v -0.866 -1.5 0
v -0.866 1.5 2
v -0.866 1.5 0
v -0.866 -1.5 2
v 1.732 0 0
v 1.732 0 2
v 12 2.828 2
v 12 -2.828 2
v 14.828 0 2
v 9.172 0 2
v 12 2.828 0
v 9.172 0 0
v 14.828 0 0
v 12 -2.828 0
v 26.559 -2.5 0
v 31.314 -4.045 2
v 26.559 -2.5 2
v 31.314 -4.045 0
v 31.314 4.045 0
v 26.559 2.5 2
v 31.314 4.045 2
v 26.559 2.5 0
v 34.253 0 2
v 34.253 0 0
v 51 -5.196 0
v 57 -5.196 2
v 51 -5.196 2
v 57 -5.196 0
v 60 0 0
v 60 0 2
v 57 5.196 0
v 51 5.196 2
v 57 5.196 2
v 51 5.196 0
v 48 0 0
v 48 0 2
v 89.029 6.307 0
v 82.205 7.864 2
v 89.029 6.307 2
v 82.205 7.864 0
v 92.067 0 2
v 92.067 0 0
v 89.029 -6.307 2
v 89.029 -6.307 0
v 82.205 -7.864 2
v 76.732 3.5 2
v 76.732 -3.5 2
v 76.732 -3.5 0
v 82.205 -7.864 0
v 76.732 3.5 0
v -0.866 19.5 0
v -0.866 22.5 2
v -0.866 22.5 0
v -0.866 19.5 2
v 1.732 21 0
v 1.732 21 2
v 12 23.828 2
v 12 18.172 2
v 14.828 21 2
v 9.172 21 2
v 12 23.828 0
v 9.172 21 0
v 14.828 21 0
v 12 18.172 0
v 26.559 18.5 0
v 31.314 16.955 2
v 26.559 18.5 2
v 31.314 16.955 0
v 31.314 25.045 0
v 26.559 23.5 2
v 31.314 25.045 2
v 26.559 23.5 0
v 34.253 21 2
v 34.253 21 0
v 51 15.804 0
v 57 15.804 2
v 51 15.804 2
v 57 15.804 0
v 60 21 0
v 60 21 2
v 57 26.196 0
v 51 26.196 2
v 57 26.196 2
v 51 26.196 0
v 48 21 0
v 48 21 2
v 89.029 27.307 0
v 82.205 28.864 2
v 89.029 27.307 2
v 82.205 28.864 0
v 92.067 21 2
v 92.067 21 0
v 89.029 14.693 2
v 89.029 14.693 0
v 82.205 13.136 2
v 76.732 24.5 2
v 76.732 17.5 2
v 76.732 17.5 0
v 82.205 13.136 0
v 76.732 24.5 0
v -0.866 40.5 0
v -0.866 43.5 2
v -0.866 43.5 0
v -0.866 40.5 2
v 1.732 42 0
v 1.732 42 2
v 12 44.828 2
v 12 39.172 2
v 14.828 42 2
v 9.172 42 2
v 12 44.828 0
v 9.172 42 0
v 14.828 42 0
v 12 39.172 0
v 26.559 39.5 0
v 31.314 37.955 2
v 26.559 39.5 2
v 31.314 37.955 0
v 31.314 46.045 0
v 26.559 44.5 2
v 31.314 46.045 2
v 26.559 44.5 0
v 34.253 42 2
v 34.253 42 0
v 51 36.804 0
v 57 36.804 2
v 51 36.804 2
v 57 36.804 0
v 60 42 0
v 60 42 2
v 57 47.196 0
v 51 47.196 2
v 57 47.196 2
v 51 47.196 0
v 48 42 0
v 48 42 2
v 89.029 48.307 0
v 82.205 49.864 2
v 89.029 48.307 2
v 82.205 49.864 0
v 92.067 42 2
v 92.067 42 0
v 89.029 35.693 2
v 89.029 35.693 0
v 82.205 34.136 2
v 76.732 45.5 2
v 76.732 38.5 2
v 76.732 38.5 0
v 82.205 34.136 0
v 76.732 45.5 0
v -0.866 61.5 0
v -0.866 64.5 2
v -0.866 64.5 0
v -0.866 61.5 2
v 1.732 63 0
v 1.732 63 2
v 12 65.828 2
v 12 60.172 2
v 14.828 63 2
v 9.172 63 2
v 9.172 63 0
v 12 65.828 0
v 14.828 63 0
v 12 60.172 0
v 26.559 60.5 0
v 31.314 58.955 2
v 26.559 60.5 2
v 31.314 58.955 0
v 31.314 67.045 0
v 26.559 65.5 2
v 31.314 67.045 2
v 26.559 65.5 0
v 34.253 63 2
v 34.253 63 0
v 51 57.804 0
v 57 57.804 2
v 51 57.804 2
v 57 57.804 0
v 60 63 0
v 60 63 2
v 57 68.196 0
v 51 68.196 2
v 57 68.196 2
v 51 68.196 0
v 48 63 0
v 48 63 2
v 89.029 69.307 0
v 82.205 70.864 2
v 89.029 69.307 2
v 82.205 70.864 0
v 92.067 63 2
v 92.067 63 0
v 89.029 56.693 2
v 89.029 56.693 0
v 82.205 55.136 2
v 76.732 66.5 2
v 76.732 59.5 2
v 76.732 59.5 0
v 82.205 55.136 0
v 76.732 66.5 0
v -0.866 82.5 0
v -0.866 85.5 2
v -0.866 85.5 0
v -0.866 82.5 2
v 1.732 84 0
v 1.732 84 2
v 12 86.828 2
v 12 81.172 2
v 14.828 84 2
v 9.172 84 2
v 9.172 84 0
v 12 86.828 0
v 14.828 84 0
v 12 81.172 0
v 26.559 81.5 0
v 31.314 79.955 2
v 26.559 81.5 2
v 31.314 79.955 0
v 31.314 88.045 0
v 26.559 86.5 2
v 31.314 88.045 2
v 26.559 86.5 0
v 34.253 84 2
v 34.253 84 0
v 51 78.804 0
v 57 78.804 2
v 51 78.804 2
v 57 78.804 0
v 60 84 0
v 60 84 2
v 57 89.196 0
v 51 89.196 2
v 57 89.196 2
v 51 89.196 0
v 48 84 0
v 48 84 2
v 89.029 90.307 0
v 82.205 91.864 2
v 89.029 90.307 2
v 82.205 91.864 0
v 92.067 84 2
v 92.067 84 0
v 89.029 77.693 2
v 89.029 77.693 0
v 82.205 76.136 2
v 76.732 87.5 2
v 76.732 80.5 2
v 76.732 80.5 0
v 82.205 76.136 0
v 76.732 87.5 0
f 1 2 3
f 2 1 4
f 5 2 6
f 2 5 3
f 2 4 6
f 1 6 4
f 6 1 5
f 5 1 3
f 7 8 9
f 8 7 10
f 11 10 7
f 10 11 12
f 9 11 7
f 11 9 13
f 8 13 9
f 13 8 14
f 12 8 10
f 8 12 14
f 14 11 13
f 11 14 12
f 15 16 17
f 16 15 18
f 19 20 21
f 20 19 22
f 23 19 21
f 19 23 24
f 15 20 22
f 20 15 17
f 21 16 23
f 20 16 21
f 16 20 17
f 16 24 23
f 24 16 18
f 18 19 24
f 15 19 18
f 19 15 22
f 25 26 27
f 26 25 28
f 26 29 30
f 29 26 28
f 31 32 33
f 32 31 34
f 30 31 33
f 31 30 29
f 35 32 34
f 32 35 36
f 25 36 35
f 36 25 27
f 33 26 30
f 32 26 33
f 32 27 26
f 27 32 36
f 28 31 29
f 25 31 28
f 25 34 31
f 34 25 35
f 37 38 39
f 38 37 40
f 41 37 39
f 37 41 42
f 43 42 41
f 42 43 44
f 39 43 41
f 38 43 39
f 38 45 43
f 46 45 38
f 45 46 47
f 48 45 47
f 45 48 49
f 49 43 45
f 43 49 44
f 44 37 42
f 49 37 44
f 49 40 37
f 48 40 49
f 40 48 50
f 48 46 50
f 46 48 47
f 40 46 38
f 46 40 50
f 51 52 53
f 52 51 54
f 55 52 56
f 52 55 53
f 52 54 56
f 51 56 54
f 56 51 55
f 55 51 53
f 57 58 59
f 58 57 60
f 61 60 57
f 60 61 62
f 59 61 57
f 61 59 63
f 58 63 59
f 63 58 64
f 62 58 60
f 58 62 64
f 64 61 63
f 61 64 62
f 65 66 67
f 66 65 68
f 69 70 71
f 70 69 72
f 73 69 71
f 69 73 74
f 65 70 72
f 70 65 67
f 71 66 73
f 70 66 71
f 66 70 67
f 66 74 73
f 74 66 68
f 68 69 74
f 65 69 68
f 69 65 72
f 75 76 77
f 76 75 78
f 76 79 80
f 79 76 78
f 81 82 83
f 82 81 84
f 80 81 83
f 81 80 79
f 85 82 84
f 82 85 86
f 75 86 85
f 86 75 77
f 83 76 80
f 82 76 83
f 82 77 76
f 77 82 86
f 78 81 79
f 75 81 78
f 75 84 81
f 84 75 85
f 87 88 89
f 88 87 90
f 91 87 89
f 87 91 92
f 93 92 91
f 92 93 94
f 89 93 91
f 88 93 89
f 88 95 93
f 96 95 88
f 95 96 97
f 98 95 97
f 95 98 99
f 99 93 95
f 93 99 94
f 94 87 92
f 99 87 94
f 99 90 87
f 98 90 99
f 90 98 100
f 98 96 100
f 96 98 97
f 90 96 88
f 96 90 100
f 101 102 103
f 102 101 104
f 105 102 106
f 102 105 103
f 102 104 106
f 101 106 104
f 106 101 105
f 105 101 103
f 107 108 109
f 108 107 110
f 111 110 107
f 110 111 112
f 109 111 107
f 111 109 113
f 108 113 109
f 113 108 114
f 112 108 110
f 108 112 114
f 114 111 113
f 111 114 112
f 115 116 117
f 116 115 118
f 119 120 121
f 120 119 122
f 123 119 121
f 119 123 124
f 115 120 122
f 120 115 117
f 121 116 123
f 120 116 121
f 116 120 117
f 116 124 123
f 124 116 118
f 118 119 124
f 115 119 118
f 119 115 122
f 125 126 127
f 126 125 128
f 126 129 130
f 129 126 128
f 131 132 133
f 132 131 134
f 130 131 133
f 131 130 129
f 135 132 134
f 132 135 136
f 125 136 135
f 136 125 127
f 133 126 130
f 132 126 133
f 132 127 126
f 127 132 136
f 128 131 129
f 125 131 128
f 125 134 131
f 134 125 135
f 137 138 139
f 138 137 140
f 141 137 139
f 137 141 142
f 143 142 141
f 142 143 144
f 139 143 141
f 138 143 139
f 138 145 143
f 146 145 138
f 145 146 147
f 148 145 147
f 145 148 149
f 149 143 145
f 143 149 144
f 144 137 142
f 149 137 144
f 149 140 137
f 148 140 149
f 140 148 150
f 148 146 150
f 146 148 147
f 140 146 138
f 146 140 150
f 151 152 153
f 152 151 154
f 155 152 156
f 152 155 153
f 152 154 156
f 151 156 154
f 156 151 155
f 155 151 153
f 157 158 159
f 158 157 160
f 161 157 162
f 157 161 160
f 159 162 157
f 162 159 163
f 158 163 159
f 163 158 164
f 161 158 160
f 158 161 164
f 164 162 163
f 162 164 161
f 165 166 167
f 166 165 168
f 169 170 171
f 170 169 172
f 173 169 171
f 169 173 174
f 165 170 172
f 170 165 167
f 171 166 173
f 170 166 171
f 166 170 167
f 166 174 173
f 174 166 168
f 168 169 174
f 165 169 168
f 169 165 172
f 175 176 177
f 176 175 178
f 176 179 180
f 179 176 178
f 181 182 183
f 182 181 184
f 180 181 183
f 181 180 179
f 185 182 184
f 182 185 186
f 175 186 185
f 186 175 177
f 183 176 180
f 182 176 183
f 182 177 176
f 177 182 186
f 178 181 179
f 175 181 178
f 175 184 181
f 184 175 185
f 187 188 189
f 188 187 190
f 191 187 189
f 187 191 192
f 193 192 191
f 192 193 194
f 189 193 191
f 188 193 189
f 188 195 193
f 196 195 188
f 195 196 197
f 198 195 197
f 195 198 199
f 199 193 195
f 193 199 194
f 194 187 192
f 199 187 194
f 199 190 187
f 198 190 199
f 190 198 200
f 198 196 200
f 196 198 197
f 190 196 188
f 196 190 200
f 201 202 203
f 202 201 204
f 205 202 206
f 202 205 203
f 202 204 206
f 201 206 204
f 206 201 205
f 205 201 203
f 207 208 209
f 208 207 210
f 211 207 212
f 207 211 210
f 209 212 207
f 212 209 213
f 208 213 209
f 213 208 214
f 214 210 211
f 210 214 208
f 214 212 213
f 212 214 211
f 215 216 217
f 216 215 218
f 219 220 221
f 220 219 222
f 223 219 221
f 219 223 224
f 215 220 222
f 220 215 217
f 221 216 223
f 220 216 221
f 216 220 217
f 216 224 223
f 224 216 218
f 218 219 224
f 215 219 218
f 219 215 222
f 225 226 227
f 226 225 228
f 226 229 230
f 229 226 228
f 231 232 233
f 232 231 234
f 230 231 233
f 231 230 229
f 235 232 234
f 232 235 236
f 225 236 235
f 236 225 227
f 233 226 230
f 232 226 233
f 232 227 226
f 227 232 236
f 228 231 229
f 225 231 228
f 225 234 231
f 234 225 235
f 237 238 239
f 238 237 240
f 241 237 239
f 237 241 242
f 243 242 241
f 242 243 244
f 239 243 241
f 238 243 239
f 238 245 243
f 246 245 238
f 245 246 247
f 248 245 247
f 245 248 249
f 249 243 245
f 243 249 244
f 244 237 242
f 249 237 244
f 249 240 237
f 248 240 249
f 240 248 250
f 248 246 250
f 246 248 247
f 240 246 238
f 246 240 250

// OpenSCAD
// Copyright 2019 Luke Johnson
// Copyright 2019 Michael K Johnson
// Licensed under the Creative Commons - Attribution license.
// http://creativecommons.org/licenses/by/3.0/

// Create a set of polygon tiles, all with the same length sides

// How many sides should the larges polygon have?
max_sides=7; // [3:16]
// How many tiles of each size?
quantity=5; // [1:10]
// How long should each side be (mm)
side_length=15; // [5:25]
// How thick should the tiles be (mm)
height=2; // [1:5]

module polygon_tile(sides, side_length, height) {
    int_ang=((sides-2)*180)/sides;
    cylinder(r=(sides)/(2*cos(int_ang/2)),h=height,$fn=sides);
}

for (t=[1:quantity]) {
    translate([0, (t-1) * (max_sides*side_length/(5)), 0]) {
        for (sides=[3:max_sides]) {
            translate([(sides-3) * (sides*side_length/(5)), 0, 0])
                polygon_tile(sides, side_length, height);
        }
    }
}
